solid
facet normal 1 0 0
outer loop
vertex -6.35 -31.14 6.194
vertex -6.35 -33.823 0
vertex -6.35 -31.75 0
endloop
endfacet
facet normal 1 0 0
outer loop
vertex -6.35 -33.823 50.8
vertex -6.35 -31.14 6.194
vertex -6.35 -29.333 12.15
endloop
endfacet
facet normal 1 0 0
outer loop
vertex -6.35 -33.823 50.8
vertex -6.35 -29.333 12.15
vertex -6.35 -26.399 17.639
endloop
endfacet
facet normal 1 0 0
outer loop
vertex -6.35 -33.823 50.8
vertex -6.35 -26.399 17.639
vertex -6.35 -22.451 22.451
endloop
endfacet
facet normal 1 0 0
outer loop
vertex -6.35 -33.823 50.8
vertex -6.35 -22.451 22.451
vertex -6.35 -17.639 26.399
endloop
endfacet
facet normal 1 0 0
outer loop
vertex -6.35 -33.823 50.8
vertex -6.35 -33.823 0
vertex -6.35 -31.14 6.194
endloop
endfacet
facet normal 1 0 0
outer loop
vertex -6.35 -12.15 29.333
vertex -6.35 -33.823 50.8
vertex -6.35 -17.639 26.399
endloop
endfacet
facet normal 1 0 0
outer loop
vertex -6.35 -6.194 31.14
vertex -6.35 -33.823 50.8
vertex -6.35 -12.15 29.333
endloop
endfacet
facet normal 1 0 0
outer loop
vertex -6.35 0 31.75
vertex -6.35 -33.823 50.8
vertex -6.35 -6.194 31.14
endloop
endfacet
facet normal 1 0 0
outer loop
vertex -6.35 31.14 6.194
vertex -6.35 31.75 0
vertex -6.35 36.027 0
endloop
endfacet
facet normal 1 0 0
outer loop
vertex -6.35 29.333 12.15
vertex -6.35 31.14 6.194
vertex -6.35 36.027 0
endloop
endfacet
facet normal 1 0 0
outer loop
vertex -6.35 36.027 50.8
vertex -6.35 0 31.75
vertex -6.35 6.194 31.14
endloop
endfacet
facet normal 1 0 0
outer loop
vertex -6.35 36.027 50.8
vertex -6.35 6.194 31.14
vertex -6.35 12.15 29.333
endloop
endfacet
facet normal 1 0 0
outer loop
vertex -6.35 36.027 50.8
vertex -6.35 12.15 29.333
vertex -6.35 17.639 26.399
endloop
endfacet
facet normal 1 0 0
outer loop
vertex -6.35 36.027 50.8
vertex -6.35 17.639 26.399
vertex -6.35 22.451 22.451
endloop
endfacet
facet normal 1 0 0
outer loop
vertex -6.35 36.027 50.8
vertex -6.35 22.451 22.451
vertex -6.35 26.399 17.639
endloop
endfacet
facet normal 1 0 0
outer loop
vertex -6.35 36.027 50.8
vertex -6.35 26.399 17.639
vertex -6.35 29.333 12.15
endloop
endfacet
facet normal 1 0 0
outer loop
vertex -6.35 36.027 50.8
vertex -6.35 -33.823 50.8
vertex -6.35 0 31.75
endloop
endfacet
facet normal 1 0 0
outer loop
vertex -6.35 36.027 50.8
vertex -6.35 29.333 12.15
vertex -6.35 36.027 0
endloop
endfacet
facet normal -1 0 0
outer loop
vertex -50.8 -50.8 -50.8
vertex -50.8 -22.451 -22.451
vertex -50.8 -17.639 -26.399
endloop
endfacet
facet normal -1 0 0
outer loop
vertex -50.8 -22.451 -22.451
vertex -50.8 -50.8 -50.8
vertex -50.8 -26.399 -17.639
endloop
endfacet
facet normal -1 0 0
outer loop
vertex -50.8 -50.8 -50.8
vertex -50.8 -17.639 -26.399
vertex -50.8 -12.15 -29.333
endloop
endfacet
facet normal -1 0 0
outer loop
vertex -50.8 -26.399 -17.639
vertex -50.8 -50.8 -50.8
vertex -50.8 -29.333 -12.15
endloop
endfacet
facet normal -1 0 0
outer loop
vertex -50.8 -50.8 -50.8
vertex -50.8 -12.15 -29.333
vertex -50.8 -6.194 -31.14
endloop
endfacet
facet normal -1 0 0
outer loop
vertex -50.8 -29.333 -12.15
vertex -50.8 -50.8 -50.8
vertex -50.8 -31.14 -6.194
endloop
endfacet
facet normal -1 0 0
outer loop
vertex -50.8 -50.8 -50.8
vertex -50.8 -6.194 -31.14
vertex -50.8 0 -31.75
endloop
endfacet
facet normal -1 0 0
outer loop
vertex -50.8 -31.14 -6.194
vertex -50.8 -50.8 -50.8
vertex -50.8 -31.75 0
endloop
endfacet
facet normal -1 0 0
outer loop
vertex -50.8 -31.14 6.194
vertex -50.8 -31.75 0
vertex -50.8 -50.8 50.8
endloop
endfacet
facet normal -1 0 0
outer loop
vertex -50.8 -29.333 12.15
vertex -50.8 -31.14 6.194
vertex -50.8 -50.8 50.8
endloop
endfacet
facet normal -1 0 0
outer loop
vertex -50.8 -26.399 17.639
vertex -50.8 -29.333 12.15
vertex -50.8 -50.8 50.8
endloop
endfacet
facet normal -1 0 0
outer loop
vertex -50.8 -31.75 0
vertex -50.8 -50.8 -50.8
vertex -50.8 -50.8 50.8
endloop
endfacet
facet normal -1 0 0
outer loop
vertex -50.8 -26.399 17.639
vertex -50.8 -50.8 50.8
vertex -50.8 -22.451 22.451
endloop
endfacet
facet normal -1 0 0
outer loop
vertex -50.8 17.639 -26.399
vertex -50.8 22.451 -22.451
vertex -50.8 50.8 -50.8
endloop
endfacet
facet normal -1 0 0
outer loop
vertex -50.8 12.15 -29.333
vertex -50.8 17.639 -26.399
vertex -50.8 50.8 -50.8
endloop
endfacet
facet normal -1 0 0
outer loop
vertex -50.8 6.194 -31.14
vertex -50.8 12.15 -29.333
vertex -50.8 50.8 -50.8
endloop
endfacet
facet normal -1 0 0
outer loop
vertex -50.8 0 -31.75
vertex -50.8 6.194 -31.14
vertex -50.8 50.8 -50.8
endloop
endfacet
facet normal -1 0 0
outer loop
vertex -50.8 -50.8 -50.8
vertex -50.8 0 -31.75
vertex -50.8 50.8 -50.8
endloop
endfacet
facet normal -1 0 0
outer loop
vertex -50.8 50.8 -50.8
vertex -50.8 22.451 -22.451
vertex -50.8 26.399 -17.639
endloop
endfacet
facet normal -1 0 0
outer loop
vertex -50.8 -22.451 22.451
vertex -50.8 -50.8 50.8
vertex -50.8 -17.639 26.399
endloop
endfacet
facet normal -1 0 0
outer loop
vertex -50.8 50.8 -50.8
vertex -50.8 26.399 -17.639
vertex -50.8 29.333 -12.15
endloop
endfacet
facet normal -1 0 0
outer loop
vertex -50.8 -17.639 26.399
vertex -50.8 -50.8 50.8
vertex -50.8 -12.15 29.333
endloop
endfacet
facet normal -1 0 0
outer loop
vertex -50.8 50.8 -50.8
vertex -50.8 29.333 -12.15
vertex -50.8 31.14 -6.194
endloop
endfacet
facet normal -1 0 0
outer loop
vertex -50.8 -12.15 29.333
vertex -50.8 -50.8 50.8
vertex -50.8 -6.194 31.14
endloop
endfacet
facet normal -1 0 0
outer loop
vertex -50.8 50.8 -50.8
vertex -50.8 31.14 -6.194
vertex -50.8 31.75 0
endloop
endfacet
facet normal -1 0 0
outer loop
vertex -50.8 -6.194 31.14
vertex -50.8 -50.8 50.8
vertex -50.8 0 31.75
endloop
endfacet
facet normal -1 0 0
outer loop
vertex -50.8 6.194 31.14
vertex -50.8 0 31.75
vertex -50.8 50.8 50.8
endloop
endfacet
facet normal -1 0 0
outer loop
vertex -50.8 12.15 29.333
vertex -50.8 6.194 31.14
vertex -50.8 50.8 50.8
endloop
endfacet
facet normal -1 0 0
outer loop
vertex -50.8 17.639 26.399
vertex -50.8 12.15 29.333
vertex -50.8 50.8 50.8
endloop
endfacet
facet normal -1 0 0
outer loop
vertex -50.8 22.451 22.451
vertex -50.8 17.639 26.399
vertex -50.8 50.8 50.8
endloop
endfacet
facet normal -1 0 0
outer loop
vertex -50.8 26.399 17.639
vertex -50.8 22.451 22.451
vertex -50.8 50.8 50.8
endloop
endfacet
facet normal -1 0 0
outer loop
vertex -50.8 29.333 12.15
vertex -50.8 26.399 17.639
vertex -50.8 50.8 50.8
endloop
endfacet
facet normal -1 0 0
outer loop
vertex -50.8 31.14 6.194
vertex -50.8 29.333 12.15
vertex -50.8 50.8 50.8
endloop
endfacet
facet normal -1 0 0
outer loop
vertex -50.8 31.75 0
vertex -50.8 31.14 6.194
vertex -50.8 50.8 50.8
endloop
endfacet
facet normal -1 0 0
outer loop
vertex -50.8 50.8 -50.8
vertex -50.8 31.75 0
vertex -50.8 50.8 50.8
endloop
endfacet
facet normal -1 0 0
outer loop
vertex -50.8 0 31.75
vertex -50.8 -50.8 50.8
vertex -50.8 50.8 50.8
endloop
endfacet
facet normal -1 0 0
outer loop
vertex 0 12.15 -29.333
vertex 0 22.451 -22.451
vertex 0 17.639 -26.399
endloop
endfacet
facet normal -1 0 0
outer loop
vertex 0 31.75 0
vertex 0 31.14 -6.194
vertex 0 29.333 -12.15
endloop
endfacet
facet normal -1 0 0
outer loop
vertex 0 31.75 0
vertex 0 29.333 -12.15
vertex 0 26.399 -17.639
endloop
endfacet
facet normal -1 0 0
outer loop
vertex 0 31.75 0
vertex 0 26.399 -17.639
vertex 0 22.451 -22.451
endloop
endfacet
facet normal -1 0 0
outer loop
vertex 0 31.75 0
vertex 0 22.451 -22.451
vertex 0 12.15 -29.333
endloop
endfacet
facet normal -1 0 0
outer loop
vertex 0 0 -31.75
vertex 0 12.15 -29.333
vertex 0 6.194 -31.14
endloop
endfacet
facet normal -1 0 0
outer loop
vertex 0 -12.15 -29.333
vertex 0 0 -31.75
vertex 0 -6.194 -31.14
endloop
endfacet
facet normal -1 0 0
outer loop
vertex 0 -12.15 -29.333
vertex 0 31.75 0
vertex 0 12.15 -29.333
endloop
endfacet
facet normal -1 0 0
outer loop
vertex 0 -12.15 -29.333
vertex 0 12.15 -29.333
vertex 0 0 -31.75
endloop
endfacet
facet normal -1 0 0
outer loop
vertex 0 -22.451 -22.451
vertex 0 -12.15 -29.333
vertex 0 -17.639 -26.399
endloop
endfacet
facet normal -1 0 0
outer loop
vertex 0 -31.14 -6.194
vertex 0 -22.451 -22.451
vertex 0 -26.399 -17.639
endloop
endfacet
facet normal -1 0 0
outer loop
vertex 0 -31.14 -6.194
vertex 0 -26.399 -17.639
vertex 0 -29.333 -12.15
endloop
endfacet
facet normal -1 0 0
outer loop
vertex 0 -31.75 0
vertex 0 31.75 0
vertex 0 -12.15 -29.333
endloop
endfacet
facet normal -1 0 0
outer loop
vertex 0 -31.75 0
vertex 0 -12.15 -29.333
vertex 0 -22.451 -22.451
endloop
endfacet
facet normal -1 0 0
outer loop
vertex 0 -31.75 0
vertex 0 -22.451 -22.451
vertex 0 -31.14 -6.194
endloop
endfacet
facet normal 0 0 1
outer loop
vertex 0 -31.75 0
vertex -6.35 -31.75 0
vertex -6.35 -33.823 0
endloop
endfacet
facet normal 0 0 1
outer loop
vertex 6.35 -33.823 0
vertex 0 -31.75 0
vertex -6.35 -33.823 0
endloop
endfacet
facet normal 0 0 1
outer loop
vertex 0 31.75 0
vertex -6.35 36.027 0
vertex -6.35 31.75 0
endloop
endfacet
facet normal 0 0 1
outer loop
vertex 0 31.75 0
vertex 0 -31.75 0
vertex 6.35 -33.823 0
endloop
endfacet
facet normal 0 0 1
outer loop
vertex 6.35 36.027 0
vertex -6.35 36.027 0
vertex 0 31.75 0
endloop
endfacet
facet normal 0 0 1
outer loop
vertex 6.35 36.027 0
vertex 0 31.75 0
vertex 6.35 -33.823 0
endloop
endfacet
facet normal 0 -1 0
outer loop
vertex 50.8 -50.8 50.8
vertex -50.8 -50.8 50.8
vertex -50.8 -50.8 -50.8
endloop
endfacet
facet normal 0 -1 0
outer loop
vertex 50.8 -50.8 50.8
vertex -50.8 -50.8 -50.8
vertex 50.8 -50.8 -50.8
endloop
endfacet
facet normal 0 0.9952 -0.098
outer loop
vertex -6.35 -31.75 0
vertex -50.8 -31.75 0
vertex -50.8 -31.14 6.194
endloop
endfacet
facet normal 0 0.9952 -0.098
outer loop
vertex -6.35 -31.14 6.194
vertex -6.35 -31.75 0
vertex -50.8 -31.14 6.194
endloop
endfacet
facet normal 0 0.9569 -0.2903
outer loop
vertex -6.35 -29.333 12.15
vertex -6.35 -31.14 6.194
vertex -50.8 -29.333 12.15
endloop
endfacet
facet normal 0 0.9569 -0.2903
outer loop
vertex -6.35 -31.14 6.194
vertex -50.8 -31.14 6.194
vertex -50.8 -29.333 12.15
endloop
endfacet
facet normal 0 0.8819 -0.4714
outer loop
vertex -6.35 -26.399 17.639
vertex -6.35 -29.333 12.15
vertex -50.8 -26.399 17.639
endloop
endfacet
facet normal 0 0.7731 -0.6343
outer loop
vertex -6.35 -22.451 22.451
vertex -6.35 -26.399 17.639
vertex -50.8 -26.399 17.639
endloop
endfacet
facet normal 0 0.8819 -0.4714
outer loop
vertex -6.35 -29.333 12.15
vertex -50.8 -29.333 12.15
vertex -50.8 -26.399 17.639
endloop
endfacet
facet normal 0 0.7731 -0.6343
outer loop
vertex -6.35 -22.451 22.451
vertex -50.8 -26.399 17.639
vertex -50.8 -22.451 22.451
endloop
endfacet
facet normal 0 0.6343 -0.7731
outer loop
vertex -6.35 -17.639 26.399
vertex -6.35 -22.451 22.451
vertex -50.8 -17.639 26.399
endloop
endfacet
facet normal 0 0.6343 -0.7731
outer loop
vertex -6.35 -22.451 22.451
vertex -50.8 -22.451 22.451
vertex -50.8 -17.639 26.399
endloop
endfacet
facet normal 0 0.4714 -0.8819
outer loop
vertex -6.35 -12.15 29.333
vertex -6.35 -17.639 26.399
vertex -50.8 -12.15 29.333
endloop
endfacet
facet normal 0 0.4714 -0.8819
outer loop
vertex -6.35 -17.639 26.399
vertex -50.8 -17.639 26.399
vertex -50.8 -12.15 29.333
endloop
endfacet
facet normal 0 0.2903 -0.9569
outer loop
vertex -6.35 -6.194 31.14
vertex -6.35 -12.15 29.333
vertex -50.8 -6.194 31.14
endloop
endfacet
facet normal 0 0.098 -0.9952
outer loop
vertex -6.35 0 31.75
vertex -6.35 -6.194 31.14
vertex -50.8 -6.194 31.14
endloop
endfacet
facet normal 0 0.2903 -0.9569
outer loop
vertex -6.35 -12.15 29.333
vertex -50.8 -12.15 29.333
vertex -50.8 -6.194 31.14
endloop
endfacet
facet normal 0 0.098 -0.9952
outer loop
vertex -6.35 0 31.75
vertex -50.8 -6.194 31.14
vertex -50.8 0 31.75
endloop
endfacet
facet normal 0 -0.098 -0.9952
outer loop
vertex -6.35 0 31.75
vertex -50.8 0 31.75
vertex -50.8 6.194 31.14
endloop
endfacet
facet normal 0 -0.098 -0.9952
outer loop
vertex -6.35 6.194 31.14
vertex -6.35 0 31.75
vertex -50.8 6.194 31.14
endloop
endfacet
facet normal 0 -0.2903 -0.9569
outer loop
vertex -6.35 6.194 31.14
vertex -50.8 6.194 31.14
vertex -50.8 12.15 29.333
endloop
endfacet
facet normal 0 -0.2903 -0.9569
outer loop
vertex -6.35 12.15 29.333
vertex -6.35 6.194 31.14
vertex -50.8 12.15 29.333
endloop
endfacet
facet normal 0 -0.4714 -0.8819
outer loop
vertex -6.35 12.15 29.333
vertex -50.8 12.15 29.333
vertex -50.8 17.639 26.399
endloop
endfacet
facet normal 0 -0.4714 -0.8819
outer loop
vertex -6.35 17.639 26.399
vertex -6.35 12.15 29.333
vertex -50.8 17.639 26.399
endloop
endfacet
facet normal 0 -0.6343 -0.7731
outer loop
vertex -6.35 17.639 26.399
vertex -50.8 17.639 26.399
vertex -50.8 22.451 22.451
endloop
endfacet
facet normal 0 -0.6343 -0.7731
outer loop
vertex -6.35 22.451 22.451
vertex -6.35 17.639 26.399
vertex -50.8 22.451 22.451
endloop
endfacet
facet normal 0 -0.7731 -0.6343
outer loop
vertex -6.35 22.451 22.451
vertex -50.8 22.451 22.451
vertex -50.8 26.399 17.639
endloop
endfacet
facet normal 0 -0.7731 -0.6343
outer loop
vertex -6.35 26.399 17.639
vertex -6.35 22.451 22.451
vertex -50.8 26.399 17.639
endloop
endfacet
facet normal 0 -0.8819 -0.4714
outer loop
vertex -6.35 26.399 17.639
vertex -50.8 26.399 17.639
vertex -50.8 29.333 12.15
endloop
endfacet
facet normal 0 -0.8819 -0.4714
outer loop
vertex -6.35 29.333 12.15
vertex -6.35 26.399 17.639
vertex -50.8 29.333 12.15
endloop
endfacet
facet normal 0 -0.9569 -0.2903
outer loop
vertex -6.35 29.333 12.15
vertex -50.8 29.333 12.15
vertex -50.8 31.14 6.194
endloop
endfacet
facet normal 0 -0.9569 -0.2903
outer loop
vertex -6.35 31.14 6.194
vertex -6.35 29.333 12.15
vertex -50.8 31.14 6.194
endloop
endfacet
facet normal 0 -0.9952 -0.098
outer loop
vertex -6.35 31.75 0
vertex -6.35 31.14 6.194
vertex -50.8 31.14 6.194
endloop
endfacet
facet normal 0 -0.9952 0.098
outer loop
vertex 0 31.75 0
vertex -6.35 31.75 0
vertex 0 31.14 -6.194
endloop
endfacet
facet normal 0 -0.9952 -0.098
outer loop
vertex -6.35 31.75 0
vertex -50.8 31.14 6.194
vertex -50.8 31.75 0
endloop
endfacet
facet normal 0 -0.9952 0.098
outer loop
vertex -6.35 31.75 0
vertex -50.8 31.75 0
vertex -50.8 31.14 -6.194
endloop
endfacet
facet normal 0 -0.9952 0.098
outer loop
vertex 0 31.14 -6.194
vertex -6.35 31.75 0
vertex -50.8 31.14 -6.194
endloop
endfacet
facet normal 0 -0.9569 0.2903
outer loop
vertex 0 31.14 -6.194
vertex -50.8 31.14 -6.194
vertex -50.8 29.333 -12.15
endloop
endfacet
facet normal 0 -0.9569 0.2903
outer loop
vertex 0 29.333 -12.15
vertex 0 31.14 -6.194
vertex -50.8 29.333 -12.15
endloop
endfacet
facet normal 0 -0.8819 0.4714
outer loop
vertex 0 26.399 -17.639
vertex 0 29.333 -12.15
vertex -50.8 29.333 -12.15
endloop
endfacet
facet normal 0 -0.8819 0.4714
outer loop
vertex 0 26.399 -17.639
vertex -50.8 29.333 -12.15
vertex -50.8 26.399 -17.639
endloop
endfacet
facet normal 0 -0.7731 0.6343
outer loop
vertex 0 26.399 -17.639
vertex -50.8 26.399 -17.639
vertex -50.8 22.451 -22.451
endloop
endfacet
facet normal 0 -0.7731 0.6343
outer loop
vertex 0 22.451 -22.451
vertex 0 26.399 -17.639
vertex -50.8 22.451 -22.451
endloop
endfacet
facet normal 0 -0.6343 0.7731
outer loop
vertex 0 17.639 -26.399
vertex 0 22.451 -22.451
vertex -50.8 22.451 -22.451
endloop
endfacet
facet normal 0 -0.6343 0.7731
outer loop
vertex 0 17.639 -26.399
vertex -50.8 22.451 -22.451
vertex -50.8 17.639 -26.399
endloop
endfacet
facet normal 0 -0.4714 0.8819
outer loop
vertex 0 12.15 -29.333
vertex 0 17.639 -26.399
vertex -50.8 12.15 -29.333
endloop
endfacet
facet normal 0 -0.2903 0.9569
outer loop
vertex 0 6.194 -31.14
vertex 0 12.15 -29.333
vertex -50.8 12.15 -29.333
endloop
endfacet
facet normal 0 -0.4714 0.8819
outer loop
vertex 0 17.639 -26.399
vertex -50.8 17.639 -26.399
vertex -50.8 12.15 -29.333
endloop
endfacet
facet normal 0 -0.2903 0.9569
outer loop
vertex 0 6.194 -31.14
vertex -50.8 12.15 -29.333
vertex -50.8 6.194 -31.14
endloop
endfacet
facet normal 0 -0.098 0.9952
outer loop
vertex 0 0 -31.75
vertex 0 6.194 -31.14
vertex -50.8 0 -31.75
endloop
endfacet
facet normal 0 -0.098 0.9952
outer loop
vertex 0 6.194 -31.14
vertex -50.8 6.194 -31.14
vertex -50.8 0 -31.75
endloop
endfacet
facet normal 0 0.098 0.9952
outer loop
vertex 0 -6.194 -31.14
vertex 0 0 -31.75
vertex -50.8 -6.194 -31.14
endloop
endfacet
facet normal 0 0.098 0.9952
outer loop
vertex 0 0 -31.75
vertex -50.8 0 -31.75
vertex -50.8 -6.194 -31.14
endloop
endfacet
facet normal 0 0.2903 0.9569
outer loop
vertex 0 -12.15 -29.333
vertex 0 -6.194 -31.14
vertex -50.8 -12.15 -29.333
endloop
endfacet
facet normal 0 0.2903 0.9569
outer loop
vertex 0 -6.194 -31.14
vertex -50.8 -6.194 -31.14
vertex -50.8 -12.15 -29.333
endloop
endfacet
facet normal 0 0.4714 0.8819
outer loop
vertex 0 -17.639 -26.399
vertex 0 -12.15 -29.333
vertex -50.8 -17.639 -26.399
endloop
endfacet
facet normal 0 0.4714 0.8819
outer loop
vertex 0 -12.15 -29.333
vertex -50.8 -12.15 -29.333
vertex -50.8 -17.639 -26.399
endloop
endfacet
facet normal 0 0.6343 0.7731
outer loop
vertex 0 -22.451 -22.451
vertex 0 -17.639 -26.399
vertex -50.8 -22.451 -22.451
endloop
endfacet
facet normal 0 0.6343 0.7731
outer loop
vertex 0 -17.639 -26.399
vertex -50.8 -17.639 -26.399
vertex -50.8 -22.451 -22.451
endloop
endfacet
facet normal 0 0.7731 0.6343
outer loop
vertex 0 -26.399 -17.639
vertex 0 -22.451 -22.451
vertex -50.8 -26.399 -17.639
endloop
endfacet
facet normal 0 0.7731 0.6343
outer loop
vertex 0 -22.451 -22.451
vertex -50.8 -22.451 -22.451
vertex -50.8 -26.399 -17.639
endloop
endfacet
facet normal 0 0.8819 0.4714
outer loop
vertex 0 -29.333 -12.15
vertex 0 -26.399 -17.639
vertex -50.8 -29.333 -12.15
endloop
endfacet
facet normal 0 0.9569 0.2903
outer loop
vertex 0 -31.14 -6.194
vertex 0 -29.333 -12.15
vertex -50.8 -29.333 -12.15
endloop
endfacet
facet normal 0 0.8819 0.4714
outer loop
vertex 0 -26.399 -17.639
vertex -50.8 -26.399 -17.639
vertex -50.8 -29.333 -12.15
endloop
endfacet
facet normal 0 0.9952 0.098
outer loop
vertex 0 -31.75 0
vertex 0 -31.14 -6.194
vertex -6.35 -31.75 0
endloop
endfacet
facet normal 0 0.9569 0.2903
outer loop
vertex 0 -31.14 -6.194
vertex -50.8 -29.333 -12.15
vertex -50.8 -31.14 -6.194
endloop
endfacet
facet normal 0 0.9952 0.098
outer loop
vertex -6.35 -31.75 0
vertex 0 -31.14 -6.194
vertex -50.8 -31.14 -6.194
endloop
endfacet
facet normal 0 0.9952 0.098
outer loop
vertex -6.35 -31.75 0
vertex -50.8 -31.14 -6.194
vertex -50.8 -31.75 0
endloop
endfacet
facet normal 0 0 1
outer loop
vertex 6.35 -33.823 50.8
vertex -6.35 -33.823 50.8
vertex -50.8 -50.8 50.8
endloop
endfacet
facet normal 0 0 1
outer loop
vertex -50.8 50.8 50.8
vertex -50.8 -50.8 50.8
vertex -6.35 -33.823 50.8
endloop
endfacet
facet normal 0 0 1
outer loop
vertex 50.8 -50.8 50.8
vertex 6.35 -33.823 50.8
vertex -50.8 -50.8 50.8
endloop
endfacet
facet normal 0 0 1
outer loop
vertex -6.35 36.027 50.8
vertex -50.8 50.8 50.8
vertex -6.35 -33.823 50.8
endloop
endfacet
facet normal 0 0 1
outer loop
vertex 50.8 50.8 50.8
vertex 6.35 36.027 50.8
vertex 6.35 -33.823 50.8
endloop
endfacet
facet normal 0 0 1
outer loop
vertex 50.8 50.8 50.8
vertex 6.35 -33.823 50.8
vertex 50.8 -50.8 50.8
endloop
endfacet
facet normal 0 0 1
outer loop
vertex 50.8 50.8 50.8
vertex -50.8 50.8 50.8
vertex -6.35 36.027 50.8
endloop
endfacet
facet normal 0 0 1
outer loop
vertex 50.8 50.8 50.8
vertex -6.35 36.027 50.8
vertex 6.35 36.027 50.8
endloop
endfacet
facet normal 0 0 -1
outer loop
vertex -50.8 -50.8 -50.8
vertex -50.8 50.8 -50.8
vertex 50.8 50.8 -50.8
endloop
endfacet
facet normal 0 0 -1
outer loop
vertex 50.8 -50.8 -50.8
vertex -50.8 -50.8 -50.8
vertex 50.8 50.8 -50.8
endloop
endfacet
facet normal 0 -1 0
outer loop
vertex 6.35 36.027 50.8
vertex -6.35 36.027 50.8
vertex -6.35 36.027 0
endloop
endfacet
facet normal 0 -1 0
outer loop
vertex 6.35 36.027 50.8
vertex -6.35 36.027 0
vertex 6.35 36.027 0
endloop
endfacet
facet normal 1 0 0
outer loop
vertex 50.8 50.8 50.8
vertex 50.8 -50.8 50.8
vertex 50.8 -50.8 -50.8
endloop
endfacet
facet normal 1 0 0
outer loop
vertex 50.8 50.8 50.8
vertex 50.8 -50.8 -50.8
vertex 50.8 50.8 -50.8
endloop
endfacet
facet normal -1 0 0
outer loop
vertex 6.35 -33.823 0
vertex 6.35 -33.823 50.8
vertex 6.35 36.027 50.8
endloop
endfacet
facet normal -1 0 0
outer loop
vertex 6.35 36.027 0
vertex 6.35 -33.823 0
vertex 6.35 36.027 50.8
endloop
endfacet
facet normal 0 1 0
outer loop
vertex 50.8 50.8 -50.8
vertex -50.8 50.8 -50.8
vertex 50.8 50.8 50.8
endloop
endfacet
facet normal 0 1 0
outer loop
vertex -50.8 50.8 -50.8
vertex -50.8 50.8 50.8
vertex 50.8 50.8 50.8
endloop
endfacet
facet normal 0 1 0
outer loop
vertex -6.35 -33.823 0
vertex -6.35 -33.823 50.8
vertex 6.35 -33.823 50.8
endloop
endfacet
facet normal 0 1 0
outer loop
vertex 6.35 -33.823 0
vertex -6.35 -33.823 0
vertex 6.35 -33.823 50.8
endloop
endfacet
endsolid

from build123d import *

# Parameters (mm, degrees)
F0_W     = 101.6
F0_H     = 101.6
F1_DEPTH = 50.8
F2_W     = 12.7
F2_H     = 69.85
F3_DEPTH = 50.8
F4_R     = 31.75
F5_DEPTH = 50.8


with BuildPart() as f1:
    # F0 (on Top) → F1 (new body, symmetric)
    with BuildSketch(Plane.XY):
        Rectangle(F0_W, F0_H)
    extrude(amount=F1_DEPTH, both=True)

    # F2 (on face) → F3 (cut)
    with BuildSketch(Plane.XY.offset(50.8)):
        with Locations((0, 1.10153)):
            Rectangle(F2_W, F2_H)
    extrude(amount=-F3_DEPTH, mode=Mode.SUBTRACT)

    # F4 (on face) → F5 (cut)
    with BuildSketch(Plane(origin=(-50.8, 0, 0), x_dir=(0, -1, 0), z_dir=(-1, 0, 0))):
        Circle(F4_R)
    extrude(amount=-F5_DEPTH, mode=Mode.SUBTRACT)


solid = f1.part
